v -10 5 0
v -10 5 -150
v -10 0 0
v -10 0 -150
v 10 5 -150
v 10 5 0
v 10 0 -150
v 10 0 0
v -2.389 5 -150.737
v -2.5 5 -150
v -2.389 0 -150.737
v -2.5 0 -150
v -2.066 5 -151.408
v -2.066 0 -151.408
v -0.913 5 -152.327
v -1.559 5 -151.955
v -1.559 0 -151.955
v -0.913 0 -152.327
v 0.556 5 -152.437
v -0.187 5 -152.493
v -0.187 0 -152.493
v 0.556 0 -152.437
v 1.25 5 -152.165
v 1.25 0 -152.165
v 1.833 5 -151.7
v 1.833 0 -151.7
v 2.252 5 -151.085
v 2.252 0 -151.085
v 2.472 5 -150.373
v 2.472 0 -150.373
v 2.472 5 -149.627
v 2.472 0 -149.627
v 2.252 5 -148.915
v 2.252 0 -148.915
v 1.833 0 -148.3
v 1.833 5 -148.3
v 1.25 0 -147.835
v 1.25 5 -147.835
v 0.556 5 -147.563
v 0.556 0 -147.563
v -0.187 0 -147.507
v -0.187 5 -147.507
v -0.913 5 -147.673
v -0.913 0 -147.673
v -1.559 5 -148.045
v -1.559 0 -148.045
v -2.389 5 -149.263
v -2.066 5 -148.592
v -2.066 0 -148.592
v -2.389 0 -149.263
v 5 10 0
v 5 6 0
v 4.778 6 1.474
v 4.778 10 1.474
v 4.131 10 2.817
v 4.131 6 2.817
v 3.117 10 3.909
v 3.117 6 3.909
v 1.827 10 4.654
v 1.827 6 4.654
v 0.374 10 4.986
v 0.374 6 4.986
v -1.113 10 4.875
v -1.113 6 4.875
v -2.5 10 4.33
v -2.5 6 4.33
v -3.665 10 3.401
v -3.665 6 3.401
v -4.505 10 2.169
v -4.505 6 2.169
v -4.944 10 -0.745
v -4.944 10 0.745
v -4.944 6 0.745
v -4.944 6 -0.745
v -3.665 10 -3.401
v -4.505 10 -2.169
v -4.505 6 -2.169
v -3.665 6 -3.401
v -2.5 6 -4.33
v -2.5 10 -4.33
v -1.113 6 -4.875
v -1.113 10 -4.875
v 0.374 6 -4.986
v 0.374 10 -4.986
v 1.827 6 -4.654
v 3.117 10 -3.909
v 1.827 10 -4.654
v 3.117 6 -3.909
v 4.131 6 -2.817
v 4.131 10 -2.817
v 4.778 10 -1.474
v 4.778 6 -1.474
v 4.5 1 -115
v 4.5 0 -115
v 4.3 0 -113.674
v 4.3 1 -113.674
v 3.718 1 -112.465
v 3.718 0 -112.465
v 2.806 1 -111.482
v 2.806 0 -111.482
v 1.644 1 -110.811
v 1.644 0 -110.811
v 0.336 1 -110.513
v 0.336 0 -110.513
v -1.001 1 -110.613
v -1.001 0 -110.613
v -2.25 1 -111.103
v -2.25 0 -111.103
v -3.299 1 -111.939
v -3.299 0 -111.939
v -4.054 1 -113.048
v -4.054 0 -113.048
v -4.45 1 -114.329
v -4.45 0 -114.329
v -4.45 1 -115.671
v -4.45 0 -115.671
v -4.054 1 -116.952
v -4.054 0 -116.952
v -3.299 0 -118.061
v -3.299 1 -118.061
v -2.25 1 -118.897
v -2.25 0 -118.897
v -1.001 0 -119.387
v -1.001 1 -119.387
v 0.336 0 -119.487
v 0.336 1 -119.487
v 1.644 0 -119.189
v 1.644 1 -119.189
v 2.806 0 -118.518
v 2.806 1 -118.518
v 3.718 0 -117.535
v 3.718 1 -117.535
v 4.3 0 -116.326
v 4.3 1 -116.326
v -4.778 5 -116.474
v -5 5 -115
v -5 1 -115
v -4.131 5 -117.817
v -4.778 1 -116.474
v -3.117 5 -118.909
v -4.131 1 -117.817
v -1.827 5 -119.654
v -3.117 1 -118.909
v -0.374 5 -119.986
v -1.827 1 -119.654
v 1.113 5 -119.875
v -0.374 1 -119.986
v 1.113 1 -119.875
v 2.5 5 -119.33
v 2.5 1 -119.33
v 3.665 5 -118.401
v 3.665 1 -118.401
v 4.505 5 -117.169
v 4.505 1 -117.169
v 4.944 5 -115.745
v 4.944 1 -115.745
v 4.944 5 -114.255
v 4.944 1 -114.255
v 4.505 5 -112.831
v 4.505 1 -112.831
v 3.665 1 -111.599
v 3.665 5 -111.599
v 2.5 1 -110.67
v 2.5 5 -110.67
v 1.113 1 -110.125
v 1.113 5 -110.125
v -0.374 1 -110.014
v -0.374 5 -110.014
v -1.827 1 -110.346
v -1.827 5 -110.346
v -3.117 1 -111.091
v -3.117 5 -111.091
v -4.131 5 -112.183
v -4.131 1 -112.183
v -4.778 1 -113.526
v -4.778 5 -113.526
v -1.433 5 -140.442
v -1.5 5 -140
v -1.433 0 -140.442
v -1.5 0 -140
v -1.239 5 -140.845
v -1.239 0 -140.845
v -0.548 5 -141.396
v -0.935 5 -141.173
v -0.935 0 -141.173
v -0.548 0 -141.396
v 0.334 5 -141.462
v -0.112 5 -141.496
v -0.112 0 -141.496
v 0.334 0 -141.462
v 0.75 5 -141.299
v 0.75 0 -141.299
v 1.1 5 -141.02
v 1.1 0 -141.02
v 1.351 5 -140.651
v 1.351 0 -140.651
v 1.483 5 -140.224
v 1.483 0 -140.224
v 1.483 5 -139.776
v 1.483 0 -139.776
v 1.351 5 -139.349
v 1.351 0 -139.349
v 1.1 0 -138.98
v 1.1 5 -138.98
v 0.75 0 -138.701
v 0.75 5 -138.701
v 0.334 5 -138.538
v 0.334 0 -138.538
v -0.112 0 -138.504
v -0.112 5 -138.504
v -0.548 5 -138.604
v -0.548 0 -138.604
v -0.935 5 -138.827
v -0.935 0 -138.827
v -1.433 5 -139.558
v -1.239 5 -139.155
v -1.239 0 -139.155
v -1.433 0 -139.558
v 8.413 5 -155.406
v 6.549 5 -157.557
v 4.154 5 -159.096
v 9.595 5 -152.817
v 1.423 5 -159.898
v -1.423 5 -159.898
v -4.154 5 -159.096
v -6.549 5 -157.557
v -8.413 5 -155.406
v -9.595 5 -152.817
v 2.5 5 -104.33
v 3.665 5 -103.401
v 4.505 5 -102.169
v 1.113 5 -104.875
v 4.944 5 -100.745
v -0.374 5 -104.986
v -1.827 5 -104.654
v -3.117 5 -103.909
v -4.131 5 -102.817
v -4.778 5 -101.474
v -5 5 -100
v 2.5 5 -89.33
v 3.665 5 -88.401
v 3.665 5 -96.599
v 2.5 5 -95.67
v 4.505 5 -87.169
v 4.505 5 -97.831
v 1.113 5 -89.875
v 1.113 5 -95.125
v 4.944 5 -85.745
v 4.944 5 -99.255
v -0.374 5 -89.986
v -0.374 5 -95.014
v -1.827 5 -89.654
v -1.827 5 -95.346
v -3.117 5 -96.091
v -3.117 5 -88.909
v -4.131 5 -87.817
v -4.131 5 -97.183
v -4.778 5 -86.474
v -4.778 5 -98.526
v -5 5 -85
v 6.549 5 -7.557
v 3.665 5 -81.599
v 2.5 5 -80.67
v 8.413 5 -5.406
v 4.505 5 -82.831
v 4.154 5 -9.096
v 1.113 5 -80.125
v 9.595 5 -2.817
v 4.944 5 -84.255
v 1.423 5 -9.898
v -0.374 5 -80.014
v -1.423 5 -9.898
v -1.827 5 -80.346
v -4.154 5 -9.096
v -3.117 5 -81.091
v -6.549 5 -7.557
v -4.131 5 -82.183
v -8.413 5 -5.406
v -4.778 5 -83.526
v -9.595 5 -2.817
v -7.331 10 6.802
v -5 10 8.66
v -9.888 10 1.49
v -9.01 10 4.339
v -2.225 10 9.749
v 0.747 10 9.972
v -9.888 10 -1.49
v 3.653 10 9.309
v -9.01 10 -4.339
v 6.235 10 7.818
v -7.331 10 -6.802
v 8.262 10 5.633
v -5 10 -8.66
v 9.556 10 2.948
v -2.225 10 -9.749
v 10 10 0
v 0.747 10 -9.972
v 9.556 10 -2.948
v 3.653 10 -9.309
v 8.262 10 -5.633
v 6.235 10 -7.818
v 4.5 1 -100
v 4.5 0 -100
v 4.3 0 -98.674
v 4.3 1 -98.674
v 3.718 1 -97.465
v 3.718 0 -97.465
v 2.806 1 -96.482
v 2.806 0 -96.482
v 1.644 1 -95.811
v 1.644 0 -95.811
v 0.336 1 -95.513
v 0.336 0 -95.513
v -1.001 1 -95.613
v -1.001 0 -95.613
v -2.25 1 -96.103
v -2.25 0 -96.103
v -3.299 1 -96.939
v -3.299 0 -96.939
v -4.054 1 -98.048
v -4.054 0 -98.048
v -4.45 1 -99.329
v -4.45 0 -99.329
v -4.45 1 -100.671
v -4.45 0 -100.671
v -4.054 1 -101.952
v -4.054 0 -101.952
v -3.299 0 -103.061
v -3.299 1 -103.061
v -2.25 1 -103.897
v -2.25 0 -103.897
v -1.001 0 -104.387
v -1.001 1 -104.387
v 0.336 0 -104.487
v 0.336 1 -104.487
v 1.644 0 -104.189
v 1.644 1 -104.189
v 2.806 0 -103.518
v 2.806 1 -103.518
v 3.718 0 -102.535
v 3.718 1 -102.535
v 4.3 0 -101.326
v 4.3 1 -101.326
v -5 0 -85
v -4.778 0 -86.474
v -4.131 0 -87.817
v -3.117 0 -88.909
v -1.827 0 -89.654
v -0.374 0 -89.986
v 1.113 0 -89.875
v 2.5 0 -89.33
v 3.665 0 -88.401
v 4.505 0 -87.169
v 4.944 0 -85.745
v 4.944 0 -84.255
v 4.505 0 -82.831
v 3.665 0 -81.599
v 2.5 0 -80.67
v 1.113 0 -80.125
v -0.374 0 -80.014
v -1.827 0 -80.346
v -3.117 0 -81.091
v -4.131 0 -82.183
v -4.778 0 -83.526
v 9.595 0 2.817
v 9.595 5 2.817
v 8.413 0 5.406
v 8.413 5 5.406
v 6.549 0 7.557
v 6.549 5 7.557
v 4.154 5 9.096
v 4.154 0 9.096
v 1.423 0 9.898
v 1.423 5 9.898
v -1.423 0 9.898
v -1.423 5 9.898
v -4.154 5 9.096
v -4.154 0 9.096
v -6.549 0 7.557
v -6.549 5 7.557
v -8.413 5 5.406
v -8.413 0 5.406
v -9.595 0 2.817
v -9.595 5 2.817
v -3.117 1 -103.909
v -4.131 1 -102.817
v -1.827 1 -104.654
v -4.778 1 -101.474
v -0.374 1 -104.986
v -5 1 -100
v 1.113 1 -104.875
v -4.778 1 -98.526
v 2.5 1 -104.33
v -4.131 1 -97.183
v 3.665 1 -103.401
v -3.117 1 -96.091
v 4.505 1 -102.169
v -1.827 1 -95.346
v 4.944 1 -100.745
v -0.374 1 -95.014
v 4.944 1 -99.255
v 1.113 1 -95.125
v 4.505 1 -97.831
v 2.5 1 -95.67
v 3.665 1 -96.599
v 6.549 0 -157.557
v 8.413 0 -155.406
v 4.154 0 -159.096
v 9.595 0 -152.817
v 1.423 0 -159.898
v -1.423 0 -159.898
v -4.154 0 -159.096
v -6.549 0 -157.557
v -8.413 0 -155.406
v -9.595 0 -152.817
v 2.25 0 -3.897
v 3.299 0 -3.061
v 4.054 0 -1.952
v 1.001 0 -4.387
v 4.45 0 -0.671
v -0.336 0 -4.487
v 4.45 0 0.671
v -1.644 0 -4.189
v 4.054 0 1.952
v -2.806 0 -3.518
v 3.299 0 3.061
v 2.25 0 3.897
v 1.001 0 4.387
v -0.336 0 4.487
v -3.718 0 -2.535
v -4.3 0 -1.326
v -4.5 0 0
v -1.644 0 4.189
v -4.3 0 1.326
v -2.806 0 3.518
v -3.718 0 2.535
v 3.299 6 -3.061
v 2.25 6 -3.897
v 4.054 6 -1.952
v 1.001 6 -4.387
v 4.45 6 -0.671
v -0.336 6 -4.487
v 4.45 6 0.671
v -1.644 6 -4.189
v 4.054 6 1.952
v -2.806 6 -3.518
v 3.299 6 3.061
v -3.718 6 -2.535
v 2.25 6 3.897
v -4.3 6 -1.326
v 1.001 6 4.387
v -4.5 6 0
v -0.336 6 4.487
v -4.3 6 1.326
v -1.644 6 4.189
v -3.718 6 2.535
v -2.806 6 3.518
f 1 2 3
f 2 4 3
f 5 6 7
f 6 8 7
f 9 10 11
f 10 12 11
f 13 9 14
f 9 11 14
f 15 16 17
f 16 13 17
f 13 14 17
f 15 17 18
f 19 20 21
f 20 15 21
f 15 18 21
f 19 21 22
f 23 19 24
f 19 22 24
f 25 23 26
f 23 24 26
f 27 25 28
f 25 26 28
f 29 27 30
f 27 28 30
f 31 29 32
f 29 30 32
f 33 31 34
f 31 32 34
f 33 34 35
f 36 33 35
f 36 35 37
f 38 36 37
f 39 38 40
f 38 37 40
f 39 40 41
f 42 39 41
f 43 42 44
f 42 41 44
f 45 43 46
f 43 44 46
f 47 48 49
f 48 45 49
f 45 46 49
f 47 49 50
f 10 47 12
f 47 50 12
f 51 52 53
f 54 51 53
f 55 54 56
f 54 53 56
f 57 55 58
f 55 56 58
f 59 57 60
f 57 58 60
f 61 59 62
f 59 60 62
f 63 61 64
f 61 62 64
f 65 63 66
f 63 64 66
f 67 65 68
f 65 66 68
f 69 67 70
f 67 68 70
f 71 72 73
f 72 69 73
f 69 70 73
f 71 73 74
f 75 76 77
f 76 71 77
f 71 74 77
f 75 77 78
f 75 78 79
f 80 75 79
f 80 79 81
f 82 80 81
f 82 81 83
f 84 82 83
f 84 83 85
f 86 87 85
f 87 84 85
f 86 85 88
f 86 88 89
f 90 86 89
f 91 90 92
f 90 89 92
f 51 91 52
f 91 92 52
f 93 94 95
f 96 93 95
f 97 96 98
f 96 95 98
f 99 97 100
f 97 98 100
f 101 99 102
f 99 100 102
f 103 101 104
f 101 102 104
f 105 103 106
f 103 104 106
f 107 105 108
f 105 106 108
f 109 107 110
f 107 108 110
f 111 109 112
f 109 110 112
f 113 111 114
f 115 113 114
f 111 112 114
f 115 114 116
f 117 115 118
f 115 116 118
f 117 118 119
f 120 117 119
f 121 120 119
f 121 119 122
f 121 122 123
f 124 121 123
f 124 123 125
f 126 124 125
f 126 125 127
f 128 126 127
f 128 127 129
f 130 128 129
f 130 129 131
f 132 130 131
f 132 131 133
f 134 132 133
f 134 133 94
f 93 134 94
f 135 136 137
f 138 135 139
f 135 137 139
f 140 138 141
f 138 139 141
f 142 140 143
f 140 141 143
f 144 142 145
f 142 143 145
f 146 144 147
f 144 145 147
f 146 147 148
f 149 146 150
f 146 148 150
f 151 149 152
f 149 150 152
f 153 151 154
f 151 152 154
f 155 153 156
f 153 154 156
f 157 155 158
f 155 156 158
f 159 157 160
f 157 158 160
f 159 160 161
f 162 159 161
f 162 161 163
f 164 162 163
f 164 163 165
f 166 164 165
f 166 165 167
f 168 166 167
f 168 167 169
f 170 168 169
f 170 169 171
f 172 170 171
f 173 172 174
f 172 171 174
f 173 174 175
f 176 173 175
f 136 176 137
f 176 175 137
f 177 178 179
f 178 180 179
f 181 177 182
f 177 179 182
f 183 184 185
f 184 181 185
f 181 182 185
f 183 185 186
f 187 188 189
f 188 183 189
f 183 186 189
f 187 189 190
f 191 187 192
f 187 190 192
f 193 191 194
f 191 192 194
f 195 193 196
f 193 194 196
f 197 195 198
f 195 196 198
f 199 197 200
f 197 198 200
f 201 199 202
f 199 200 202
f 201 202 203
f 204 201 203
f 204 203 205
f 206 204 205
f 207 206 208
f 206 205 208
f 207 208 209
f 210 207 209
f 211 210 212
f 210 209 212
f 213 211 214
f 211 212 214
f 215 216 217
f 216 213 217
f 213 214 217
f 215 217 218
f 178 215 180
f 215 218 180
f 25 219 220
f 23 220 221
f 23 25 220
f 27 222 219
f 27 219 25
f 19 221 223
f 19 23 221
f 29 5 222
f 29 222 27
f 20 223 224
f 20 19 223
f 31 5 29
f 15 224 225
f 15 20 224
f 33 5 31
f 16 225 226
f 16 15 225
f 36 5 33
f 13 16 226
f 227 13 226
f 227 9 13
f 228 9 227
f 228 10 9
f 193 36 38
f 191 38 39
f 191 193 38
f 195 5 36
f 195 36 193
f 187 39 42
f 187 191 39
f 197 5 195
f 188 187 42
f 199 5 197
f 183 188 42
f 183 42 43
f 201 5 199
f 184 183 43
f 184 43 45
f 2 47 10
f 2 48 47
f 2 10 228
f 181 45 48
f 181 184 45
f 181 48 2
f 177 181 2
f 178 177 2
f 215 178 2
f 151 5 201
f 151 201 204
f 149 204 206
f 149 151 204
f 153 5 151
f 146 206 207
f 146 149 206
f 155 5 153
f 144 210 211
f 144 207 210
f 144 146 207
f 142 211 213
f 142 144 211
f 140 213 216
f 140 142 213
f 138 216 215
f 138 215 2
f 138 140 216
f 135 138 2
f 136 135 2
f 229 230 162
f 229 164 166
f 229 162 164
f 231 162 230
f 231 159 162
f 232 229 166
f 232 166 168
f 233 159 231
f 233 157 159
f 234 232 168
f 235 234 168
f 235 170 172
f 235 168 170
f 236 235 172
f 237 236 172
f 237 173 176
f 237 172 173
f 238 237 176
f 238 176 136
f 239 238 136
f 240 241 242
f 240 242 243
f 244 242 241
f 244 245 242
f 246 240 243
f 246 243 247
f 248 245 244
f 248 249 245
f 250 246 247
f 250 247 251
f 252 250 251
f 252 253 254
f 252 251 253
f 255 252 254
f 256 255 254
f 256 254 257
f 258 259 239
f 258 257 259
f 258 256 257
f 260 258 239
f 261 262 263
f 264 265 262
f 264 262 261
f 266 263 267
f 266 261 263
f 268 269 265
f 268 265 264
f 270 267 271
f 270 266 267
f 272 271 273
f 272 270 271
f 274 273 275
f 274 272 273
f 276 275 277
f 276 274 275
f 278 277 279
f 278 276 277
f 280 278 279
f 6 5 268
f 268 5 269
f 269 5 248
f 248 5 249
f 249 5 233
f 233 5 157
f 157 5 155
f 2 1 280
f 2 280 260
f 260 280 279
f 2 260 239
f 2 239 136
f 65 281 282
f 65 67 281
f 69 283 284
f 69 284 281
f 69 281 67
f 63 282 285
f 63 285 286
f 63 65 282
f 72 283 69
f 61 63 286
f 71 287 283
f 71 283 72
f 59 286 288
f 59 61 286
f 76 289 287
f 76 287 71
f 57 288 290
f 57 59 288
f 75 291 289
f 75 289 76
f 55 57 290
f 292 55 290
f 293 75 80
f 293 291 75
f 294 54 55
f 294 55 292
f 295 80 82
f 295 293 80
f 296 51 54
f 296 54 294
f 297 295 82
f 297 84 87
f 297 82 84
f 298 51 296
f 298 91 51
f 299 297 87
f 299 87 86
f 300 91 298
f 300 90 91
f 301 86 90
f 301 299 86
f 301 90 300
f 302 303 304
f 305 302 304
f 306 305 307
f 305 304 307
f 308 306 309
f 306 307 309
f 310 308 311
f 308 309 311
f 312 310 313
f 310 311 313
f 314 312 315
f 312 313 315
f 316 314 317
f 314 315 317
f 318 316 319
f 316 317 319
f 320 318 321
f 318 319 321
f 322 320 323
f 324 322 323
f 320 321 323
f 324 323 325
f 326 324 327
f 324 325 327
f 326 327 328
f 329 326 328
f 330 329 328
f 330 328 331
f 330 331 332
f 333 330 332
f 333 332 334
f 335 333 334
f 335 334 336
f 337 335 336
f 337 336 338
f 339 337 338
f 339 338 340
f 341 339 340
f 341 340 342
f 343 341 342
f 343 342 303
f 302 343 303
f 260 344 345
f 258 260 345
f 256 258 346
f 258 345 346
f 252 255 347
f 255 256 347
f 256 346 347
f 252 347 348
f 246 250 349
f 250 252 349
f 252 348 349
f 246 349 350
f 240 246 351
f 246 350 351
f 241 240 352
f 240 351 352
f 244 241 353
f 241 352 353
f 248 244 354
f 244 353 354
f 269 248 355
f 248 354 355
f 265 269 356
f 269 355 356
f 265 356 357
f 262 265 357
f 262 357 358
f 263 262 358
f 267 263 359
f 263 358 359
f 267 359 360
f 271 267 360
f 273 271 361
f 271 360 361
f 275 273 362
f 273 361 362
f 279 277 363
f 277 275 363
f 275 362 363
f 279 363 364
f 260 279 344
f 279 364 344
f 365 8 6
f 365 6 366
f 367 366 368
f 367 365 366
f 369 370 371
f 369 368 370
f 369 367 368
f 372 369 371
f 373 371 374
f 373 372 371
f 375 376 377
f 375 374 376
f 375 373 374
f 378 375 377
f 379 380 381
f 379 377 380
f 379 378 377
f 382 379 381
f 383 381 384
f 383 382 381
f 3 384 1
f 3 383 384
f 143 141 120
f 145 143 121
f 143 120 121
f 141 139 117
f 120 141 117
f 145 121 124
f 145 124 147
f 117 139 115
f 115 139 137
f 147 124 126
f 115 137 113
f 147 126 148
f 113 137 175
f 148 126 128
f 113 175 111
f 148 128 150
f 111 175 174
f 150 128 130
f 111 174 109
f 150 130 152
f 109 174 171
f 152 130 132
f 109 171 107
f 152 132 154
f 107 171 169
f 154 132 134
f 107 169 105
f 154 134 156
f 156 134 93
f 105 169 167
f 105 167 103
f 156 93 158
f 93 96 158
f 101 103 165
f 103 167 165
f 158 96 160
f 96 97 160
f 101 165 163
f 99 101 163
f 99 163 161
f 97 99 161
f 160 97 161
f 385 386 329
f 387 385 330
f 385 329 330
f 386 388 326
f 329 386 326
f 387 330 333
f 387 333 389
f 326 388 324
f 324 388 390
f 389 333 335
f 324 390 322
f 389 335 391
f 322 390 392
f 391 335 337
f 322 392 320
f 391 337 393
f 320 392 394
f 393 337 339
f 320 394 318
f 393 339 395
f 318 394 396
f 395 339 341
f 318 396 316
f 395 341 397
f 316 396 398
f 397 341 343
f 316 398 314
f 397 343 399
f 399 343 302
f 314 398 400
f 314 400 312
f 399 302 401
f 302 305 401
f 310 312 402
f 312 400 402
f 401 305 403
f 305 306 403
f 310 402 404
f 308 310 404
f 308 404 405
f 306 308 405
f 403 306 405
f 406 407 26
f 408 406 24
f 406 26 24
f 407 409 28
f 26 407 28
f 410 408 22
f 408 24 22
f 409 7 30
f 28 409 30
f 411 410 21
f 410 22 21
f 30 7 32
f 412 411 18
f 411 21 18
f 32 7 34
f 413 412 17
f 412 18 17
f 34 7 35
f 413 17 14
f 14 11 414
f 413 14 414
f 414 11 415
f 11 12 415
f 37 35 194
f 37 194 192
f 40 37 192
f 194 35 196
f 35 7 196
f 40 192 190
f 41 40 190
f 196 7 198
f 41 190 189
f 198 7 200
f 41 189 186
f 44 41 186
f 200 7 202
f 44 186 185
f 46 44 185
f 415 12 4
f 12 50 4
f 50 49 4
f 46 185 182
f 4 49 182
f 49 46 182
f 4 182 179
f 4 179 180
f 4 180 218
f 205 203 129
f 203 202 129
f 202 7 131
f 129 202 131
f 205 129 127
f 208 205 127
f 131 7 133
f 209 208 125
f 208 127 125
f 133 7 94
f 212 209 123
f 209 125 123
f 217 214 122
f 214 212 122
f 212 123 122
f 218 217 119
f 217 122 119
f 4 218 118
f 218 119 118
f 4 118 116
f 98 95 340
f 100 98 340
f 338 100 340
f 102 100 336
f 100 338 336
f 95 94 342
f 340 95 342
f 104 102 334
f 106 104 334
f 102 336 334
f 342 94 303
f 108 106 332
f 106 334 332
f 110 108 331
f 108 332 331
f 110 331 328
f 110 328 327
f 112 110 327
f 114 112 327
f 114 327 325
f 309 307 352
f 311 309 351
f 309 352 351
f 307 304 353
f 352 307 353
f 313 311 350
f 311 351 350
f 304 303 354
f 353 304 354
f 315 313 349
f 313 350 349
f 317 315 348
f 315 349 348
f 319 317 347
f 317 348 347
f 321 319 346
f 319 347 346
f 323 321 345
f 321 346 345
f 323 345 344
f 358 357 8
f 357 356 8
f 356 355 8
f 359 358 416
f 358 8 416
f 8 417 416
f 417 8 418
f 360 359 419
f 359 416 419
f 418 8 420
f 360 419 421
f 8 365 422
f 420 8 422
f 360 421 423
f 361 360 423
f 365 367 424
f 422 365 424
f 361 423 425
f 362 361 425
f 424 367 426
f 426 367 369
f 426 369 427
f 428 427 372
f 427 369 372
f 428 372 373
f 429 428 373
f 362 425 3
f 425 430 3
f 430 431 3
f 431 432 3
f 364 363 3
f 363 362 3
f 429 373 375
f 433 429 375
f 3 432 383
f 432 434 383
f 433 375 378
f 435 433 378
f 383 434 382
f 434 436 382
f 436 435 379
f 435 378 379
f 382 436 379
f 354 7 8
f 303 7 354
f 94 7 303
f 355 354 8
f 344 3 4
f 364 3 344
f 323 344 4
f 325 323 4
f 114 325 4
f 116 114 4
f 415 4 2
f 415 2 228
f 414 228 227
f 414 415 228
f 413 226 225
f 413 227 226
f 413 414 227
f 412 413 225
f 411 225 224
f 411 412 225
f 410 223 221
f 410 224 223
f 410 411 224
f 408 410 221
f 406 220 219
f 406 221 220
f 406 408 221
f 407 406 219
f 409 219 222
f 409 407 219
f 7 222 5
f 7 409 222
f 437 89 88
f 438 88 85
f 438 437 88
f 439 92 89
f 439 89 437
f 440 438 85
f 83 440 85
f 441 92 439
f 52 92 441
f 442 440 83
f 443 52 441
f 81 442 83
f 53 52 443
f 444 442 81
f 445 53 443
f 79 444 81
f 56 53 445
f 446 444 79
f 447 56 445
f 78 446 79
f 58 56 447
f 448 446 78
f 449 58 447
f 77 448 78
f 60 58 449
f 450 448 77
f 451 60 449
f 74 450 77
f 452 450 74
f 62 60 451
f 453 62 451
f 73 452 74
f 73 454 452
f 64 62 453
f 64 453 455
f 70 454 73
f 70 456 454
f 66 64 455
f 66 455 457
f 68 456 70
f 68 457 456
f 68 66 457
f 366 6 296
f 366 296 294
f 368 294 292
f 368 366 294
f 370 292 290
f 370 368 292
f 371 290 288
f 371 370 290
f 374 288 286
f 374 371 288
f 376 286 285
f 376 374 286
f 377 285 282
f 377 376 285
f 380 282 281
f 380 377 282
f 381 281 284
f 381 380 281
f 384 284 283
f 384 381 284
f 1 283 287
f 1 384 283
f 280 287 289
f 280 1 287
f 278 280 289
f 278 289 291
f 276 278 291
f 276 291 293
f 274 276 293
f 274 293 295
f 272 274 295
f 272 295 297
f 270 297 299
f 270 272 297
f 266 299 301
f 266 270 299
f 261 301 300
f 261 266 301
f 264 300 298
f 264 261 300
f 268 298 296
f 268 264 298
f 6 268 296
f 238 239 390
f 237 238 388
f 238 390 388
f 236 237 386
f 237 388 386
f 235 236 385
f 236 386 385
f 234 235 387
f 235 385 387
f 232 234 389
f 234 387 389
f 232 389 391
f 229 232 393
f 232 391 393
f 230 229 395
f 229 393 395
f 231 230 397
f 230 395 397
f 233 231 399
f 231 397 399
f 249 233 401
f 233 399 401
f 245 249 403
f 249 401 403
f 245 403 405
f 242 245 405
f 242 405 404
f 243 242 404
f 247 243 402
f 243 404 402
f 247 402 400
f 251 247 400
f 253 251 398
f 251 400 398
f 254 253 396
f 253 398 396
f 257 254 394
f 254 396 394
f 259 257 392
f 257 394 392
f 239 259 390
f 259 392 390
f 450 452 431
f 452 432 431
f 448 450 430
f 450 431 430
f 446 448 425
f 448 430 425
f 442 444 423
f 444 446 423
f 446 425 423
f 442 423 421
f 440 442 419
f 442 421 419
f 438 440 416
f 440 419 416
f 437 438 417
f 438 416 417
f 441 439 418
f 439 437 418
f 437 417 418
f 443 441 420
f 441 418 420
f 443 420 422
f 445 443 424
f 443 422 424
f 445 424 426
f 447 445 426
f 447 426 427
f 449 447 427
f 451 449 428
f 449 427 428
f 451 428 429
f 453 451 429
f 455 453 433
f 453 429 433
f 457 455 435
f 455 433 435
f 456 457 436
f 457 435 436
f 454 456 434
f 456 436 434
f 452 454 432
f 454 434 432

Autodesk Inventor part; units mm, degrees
ref_plane "YZ Plane" through (0, 0, 0) normal (1, 0, 0) x (0, 1, 0)
ref_plane "XZ Plane" through (0, 0, 0) normal (0, 1, 0) x (-1, 0, 0)
ref_plane "XY Plane" through (0, 0, 0) normal (0, 0, 1) x (1, 0, 0)
sketch "Skizze3" plane through (0, 0, 0) normal (0, 1, 0) x (-1, 0, 0)
  line L0 (0, 0) -> (0, -150) construction
  line L1 (-10, 0) -> (-10, -150)
  line L2 (10, -150) -> (10, 0)
  arc A0 (10, 0) -> (-10, 0) centre (0, 0) ccw
  arc A1 (-10, -150) -> (10, -150) centre (0, -150) ccw
  circle A2 centre (0, 0) radius 5
  circle A3 centre (0, -150) radius 2.5
  circle A4 centre (0, -140) radius 1.5
  circle A5 centre (0, -115) radius 5
  circle A6 centre (0, -100) radius 5
  circle A7 centre (0, 0) radius 4.5
  circle A8 centre (0, -85) radius 5
  point P0 (0, -75)
  dimension "d4" = 150
  dimension "d5" = 10
  dimension "d6" = 10
  dimension "d7" = 5
  dimension "d8" = 3
  dimension "d9" = 10
  dimension "d12" = 10
  dimension "d13" = 10
  dimension "d15" = 15
  dimension "d27" = 9
  dimension "d34" = 115
  dimension "d35" = 15
extrude "Extrusion3" add sketch "Skizze3" along normal blind 5 contours A0 L2 A1 L1
sketch "Skizze4" plane through (0, 5, 0) normal (0, 1, 0) x (1, 0, 0)
  circle A0 centre (0, 0) radius 5 projected
  circle A1 centre (0, 0) radius 10
  dimension "d18" = 20
extrude "Extrusion4" add sketch "Skizze4" along normal blind 5
extrude "Extrusion5" add sketch "Skizze3" along normal blind 6 contours A2
sketch "Skizze5" plane through (0, 0, 0) normal (0, -1, 0) x (1, 0, 0)
  circle A0 centre (0, -130) radius 5 projected
  circle A1 centre (0, -100) radius 5 projected
  circle A2 centre (0, -115) radius 5 projected
  circle A3 centre (0, -100) radius 4.5
  circle A4 centre (0, -115) radius 4.5
  circle A5 centre (0, -130) radius 4.5
  point P0 (0, 0)
  point P1 (-1.5, -140)
  point P2 (-1.5, -140)
  dimension "d28" = 9
  dimension "d29" = 9
  dimension "d30" = 9
extrude "Extrusion7" add sketch "Skizze5" against normal blind 1 contours A1 | A2
equation "\"d4\" = Gelenk_Stifthalter"
equation "\"d35\" = d15"
equation "\"Gelenk_Stifthalter\" = 150"
properties part number "BT303_trajan20_21" material "Kunststoff, undurchsichtig Schwarz"
